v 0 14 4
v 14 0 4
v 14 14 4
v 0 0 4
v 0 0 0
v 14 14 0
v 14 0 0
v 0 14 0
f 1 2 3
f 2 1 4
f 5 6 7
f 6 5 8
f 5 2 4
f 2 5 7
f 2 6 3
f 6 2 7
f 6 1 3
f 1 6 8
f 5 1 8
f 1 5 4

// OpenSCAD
// Parameters
switch_length = 14;     // Modify these values with the actual dimensions
switch_width = 14;
switch_height = 4;

// Switch base module
module low_profile_switch_base() {
    cube([switch_length, switch_width, switch_height]);
}

// Uncomment and modify the following code if you need additional features like mounting holes or cutouts.

// // Mounting hole example
module mounting_hole() {
    difference() {
        cylinder(r=2, h=switch_height + 1, center=true);
        translate([switch_length/2, switch_width/2, -1])
            cylinder(r=1, h=switch_height + 2, center=true);
    }
}

// // Combine the switch base and mounting hole modules
module low_profile_switch_with_hole() {
    low_profile_switch_base();
    translate([switch_length/4, switch_width/4, 0])
        mounting_hole();
}

// Uncomment and modify the following code if you need additional features like cutouts or other elements.

// // Cutout example
module cutout() {
    translate([switch_length/3, switch_width/3, 0])
        cube([switch_length/3, switch_width/3, switch_height]);
}

// // Combine the switch base and cutout modules
module low_profile_switch_with_cutout() {
    low_profile_switch_base();
    cutout();
}

// Use the desired module to render the switch base
low_profile_switch_base(); // Uncomment this line to render the basic switch base

// low_profile_switch_with_hole(); // Uncomment this line to render the switch base with a mounting hole

// low_profile_switch_with_cutout(); // Uncomment this line to render the switch base with a
